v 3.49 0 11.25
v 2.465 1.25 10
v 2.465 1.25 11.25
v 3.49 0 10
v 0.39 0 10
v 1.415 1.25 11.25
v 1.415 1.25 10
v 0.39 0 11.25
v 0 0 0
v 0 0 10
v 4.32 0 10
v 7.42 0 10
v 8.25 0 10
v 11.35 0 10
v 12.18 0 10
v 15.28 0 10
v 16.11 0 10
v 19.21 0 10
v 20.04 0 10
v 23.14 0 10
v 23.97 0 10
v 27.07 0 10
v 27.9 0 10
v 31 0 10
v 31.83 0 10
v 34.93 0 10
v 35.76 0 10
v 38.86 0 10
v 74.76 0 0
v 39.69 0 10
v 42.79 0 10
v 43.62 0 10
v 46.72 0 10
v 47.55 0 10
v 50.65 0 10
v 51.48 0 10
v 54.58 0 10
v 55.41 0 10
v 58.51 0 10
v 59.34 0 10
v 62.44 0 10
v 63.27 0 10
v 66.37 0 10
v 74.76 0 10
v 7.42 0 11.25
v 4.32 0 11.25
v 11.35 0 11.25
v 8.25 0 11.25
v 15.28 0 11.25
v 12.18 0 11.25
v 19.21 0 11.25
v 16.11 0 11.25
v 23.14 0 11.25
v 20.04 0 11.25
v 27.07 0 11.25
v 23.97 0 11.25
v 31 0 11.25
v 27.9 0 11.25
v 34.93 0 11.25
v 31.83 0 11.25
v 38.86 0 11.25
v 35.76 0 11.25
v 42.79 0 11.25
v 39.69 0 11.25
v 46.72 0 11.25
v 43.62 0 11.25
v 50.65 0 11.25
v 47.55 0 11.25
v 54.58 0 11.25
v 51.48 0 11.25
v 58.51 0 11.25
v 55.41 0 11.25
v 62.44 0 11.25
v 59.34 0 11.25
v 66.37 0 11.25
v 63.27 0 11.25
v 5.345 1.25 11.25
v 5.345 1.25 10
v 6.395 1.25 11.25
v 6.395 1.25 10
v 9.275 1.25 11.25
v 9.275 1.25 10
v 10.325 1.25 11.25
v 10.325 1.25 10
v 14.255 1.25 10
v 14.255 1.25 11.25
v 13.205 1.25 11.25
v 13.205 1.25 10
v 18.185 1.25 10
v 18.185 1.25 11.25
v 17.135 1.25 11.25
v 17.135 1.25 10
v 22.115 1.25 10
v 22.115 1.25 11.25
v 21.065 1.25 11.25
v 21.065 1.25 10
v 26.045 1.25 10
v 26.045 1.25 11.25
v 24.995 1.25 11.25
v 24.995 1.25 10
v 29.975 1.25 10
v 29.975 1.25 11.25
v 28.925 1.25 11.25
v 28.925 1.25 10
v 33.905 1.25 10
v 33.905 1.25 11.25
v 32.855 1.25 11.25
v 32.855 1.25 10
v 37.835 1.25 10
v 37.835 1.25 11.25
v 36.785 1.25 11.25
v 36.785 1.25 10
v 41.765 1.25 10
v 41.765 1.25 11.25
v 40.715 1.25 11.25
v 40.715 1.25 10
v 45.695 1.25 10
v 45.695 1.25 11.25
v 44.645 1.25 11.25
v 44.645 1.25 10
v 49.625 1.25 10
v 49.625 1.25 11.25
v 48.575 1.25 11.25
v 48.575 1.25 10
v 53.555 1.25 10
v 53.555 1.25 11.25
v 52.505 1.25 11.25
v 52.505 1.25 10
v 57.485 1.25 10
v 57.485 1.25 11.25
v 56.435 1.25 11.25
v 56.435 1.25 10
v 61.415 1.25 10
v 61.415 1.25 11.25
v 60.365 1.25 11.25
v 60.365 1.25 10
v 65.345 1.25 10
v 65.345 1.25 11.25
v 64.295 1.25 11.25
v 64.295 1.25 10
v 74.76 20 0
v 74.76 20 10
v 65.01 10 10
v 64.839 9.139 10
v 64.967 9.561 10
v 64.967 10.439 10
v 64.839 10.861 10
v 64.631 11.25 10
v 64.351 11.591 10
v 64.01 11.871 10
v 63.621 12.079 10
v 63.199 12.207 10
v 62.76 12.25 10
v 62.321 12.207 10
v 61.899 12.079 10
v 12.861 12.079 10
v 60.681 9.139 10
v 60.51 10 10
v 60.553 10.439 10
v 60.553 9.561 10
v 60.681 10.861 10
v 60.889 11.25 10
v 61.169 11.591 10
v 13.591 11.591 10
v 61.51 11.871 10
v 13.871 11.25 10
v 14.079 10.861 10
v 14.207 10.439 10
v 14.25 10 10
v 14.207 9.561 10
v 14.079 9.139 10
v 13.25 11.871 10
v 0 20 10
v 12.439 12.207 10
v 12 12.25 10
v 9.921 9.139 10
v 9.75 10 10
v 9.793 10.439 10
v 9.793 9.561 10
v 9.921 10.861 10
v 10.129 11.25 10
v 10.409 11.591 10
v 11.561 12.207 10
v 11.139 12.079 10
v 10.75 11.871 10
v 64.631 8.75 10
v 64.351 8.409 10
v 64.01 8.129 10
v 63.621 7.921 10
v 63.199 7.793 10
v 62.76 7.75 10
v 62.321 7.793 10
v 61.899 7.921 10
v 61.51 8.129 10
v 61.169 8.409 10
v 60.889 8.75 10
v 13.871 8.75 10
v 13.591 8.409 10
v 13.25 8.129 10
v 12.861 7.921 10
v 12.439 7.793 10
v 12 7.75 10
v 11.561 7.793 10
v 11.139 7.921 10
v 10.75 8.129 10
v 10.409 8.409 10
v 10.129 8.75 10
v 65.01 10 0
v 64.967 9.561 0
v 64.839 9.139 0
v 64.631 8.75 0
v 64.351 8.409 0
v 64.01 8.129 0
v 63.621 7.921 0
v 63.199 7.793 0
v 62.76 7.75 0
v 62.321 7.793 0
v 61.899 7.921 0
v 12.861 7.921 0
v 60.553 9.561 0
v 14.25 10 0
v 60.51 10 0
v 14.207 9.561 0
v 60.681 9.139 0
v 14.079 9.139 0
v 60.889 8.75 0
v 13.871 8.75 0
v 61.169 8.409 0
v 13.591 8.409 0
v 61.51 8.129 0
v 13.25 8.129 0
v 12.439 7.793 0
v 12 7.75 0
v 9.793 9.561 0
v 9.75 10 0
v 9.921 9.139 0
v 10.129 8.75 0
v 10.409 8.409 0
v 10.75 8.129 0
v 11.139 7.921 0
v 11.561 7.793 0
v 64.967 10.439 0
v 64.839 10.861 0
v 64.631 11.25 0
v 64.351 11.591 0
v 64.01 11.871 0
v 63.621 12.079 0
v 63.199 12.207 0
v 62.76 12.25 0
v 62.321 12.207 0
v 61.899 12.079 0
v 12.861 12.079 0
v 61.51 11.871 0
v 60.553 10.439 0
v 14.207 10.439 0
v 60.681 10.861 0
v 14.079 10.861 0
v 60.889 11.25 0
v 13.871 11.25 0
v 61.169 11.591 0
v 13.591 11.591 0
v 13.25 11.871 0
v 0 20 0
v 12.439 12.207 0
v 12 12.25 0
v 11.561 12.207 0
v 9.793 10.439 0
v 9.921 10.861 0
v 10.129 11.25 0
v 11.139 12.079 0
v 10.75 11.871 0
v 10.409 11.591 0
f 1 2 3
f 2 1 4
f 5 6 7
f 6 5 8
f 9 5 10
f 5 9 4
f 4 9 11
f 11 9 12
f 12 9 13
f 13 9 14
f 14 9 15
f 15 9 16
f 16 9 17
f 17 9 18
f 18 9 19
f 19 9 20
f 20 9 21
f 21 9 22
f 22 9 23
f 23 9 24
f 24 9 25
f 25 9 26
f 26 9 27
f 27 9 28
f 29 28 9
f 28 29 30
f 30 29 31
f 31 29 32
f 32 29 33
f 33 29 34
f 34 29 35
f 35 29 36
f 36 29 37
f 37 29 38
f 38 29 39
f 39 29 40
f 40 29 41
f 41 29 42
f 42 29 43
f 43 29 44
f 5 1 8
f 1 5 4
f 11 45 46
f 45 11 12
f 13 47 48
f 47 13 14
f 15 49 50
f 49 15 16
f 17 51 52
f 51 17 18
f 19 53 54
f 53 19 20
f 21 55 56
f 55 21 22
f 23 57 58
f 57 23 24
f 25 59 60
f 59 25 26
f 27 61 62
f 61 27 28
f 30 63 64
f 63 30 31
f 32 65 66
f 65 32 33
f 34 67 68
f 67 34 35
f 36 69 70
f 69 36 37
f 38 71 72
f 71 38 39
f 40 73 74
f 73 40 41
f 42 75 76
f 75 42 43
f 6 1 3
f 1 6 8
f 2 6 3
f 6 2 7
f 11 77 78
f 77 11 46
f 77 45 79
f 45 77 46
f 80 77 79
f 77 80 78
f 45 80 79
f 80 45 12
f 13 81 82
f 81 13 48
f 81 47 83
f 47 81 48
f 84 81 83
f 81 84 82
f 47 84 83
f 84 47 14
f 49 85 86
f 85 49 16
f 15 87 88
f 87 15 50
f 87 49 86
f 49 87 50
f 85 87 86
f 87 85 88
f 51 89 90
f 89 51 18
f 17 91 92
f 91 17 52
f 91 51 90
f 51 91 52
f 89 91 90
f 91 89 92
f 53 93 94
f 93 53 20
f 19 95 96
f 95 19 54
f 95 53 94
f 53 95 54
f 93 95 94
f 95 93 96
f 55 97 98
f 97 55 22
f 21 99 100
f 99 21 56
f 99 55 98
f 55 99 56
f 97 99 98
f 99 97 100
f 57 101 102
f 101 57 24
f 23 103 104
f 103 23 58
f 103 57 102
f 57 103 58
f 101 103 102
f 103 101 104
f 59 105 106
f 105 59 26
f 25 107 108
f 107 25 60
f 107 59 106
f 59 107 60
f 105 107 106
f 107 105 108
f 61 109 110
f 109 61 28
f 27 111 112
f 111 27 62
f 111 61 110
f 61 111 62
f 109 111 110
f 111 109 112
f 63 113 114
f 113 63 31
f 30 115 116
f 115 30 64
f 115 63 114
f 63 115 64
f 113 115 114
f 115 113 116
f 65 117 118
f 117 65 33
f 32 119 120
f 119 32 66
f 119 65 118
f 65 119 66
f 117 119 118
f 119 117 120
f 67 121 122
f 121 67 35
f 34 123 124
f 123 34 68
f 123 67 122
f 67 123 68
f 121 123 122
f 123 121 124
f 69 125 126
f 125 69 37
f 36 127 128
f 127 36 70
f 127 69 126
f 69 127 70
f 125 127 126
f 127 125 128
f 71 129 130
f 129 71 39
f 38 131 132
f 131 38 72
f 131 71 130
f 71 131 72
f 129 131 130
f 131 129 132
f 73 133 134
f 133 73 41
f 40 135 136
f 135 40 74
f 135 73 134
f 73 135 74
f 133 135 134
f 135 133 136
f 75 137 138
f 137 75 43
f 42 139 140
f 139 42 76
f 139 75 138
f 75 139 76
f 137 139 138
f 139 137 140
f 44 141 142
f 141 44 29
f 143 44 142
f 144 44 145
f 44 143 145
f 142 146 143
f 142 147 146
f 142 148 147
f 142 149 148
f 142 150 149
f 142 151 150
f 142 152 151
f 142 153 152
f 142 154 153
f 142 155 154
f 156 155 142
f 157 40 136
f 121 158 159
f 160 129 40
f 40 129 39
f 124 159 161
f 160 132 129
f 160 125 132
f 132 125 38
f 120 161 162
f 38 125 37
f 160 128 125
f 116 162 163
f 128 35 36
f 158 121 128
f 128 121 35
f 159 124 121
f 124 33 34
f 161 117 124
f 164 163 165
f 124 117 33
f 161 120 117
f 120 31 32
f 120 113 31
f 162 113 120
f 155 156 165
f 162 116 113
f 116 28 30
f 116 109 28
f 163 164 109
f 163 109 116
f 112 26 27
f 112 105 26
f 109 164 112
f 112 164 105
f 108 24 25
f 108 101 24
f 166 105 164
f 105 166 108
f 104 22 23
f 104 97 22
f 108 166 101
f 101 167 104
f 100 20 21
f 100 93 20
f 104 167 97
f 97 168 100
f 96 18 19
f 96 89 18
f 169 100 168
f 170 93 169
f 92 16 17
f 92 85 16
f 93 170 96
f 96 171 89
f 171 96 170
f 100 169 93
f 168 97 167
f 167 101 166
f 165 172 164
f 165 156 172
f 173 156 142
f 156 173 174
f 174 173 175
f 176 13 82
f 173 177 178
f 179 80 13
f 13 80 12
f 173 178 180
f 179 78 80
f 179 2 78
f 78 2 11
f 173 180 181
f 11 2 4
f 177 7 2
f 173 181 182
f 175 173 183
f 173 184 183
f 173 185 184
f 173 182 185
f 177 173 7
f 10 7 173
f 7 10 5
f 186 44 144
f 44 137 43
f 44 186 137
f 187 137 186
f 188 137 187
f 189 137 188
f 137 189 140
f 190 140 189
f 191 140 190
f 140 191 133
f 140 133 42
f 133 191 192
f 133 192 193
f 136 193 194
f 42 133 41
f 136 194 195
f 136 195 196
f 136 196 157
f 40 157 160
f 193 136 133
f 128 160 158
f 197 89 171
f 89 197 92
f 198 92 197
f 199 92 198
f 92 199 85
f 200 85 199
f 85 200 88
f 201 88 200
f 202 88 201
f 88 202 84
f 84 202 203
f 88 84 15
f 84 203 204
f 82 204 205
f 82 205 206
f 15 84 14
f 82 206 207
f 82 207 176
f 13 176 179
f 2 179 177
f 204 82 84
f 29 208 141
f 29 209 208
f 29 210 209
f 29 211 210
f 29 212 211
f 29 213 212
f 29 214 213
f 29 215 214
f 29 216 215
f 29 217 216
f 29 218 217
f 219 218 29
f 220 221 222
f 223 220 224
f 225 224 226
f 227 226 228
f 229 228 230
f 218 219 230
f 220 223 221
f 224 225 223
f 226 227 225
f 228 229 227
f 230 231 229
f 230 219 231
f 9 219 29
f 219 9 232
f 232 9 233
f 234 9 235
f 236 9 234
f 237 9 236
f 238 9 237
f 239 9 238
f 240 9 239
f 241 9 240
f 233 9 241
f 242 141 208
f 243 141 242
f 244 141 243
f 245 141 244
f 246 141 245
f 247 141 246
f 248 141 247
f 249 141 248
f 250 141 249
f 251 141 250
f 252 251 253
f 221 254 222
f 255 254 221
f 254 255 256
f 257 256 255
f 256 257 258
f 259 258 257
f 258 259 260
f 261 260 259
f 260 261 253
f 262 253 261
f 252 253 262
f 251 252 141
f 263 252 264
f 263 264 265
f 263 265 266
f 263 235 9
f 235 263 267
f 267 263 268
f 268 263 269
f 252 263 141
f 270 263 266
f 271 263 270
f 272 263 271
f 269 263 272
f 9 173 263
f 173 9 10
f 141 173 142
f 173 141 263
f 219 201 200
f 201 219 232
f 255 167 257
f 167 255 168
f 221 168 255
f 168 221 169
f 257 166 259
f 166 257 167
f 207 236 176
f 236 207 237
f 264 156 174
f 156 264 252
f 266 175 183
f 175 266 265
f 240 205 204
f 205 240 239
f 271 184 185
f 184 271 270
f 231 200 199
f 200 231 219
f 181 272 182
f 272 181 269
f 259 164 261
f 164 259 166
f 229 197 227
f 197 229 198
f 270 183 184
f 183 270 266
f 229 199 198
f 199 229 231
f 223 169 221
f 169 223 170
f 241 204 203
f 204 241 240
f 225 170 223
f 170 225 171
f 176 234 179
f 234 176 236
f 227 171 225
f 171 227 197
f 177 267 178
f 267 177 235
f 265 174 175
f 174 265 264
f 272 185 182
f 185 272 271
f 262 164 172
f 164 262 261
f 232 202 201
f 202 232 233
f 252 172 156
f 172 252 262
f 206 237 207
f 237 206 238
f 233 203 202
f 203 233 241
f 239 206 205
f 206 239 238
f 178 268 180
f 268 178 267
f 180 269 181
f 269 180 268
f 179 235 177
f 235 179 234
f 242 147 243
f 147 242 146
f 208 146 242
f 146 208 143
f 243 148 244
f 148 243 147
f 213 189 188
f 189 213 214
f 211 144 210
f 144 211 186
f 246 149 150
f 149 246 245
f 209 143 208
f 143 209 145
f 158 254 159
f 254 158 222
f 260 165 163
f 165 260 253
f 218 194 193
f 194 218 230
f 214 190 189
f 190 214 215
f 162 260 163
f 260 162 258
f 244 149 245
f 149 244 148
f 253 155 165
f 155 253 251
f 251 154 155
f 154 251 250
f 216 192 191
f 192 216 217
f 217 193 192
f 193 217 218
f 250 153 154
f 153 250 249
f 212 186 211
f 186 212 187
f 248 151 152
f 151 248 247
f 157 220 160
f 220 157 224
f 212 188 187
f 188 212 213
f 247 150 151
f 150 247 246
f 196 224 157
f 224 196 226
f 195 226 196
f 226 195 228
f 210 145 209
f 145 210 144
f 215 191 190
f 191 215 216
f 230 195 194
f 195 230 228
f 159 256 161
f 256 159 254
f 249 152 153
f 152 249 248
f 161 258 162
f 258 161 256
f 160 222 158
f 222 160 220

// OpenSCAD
$fn = 32;

// ----------------------------------------------------------------------
// Gear rack: m=1.25 z=17, 74.76 x 20 x 11.25 mm
// ----------------------------------------------------------------------

// --- parameters (mm) ---
rack_len = 74.76;         // rack length, X
rack_w = 20;              // rack width, Y
rack_h = 11.25;           // overall height, Z
modul = 1.25;             // module
body_t = 10;              // tooth root line height
pitch = 3.93;             // circular pitch
tip_w = 1.05;             // tooth thickness at the tip
root_w = 3.1;             // tooth thickness at the root line
hole_d = 4.5;             // mounting hole
sink = 0.6;               // tooth root overlap into the body

tooth_span = 66.76;

module tooth(x0) {
  /* 20 deg flank profile, sunk into the body for a positive overlap */
  translate([x0, 0, body_t - sink])
    linear_extrude(height = rack_h - body_t + sink)
      polygon(points = [[-root_w / 2, 0], [root_w / 2, 0],
                        [tip_w / 2, rack_h - body_t],
                        [-tip_w / 2, rack_h - body_t]]);
}

difference() {
  union() {
    cube([rack_len, rack_w, body_t]);
    for (i = [0 : 17 - 1])
      tooth((i + 0.5) * pitch + (tooth_span - 17 * pitch) / 2);
  }
  translate([12, 10, -1]) cylinder(h = body_t + 2, d = hole_d);
  translate([62.76, 10, -1]) cylinder(h = body_t + 2, d = hole_d);
}
